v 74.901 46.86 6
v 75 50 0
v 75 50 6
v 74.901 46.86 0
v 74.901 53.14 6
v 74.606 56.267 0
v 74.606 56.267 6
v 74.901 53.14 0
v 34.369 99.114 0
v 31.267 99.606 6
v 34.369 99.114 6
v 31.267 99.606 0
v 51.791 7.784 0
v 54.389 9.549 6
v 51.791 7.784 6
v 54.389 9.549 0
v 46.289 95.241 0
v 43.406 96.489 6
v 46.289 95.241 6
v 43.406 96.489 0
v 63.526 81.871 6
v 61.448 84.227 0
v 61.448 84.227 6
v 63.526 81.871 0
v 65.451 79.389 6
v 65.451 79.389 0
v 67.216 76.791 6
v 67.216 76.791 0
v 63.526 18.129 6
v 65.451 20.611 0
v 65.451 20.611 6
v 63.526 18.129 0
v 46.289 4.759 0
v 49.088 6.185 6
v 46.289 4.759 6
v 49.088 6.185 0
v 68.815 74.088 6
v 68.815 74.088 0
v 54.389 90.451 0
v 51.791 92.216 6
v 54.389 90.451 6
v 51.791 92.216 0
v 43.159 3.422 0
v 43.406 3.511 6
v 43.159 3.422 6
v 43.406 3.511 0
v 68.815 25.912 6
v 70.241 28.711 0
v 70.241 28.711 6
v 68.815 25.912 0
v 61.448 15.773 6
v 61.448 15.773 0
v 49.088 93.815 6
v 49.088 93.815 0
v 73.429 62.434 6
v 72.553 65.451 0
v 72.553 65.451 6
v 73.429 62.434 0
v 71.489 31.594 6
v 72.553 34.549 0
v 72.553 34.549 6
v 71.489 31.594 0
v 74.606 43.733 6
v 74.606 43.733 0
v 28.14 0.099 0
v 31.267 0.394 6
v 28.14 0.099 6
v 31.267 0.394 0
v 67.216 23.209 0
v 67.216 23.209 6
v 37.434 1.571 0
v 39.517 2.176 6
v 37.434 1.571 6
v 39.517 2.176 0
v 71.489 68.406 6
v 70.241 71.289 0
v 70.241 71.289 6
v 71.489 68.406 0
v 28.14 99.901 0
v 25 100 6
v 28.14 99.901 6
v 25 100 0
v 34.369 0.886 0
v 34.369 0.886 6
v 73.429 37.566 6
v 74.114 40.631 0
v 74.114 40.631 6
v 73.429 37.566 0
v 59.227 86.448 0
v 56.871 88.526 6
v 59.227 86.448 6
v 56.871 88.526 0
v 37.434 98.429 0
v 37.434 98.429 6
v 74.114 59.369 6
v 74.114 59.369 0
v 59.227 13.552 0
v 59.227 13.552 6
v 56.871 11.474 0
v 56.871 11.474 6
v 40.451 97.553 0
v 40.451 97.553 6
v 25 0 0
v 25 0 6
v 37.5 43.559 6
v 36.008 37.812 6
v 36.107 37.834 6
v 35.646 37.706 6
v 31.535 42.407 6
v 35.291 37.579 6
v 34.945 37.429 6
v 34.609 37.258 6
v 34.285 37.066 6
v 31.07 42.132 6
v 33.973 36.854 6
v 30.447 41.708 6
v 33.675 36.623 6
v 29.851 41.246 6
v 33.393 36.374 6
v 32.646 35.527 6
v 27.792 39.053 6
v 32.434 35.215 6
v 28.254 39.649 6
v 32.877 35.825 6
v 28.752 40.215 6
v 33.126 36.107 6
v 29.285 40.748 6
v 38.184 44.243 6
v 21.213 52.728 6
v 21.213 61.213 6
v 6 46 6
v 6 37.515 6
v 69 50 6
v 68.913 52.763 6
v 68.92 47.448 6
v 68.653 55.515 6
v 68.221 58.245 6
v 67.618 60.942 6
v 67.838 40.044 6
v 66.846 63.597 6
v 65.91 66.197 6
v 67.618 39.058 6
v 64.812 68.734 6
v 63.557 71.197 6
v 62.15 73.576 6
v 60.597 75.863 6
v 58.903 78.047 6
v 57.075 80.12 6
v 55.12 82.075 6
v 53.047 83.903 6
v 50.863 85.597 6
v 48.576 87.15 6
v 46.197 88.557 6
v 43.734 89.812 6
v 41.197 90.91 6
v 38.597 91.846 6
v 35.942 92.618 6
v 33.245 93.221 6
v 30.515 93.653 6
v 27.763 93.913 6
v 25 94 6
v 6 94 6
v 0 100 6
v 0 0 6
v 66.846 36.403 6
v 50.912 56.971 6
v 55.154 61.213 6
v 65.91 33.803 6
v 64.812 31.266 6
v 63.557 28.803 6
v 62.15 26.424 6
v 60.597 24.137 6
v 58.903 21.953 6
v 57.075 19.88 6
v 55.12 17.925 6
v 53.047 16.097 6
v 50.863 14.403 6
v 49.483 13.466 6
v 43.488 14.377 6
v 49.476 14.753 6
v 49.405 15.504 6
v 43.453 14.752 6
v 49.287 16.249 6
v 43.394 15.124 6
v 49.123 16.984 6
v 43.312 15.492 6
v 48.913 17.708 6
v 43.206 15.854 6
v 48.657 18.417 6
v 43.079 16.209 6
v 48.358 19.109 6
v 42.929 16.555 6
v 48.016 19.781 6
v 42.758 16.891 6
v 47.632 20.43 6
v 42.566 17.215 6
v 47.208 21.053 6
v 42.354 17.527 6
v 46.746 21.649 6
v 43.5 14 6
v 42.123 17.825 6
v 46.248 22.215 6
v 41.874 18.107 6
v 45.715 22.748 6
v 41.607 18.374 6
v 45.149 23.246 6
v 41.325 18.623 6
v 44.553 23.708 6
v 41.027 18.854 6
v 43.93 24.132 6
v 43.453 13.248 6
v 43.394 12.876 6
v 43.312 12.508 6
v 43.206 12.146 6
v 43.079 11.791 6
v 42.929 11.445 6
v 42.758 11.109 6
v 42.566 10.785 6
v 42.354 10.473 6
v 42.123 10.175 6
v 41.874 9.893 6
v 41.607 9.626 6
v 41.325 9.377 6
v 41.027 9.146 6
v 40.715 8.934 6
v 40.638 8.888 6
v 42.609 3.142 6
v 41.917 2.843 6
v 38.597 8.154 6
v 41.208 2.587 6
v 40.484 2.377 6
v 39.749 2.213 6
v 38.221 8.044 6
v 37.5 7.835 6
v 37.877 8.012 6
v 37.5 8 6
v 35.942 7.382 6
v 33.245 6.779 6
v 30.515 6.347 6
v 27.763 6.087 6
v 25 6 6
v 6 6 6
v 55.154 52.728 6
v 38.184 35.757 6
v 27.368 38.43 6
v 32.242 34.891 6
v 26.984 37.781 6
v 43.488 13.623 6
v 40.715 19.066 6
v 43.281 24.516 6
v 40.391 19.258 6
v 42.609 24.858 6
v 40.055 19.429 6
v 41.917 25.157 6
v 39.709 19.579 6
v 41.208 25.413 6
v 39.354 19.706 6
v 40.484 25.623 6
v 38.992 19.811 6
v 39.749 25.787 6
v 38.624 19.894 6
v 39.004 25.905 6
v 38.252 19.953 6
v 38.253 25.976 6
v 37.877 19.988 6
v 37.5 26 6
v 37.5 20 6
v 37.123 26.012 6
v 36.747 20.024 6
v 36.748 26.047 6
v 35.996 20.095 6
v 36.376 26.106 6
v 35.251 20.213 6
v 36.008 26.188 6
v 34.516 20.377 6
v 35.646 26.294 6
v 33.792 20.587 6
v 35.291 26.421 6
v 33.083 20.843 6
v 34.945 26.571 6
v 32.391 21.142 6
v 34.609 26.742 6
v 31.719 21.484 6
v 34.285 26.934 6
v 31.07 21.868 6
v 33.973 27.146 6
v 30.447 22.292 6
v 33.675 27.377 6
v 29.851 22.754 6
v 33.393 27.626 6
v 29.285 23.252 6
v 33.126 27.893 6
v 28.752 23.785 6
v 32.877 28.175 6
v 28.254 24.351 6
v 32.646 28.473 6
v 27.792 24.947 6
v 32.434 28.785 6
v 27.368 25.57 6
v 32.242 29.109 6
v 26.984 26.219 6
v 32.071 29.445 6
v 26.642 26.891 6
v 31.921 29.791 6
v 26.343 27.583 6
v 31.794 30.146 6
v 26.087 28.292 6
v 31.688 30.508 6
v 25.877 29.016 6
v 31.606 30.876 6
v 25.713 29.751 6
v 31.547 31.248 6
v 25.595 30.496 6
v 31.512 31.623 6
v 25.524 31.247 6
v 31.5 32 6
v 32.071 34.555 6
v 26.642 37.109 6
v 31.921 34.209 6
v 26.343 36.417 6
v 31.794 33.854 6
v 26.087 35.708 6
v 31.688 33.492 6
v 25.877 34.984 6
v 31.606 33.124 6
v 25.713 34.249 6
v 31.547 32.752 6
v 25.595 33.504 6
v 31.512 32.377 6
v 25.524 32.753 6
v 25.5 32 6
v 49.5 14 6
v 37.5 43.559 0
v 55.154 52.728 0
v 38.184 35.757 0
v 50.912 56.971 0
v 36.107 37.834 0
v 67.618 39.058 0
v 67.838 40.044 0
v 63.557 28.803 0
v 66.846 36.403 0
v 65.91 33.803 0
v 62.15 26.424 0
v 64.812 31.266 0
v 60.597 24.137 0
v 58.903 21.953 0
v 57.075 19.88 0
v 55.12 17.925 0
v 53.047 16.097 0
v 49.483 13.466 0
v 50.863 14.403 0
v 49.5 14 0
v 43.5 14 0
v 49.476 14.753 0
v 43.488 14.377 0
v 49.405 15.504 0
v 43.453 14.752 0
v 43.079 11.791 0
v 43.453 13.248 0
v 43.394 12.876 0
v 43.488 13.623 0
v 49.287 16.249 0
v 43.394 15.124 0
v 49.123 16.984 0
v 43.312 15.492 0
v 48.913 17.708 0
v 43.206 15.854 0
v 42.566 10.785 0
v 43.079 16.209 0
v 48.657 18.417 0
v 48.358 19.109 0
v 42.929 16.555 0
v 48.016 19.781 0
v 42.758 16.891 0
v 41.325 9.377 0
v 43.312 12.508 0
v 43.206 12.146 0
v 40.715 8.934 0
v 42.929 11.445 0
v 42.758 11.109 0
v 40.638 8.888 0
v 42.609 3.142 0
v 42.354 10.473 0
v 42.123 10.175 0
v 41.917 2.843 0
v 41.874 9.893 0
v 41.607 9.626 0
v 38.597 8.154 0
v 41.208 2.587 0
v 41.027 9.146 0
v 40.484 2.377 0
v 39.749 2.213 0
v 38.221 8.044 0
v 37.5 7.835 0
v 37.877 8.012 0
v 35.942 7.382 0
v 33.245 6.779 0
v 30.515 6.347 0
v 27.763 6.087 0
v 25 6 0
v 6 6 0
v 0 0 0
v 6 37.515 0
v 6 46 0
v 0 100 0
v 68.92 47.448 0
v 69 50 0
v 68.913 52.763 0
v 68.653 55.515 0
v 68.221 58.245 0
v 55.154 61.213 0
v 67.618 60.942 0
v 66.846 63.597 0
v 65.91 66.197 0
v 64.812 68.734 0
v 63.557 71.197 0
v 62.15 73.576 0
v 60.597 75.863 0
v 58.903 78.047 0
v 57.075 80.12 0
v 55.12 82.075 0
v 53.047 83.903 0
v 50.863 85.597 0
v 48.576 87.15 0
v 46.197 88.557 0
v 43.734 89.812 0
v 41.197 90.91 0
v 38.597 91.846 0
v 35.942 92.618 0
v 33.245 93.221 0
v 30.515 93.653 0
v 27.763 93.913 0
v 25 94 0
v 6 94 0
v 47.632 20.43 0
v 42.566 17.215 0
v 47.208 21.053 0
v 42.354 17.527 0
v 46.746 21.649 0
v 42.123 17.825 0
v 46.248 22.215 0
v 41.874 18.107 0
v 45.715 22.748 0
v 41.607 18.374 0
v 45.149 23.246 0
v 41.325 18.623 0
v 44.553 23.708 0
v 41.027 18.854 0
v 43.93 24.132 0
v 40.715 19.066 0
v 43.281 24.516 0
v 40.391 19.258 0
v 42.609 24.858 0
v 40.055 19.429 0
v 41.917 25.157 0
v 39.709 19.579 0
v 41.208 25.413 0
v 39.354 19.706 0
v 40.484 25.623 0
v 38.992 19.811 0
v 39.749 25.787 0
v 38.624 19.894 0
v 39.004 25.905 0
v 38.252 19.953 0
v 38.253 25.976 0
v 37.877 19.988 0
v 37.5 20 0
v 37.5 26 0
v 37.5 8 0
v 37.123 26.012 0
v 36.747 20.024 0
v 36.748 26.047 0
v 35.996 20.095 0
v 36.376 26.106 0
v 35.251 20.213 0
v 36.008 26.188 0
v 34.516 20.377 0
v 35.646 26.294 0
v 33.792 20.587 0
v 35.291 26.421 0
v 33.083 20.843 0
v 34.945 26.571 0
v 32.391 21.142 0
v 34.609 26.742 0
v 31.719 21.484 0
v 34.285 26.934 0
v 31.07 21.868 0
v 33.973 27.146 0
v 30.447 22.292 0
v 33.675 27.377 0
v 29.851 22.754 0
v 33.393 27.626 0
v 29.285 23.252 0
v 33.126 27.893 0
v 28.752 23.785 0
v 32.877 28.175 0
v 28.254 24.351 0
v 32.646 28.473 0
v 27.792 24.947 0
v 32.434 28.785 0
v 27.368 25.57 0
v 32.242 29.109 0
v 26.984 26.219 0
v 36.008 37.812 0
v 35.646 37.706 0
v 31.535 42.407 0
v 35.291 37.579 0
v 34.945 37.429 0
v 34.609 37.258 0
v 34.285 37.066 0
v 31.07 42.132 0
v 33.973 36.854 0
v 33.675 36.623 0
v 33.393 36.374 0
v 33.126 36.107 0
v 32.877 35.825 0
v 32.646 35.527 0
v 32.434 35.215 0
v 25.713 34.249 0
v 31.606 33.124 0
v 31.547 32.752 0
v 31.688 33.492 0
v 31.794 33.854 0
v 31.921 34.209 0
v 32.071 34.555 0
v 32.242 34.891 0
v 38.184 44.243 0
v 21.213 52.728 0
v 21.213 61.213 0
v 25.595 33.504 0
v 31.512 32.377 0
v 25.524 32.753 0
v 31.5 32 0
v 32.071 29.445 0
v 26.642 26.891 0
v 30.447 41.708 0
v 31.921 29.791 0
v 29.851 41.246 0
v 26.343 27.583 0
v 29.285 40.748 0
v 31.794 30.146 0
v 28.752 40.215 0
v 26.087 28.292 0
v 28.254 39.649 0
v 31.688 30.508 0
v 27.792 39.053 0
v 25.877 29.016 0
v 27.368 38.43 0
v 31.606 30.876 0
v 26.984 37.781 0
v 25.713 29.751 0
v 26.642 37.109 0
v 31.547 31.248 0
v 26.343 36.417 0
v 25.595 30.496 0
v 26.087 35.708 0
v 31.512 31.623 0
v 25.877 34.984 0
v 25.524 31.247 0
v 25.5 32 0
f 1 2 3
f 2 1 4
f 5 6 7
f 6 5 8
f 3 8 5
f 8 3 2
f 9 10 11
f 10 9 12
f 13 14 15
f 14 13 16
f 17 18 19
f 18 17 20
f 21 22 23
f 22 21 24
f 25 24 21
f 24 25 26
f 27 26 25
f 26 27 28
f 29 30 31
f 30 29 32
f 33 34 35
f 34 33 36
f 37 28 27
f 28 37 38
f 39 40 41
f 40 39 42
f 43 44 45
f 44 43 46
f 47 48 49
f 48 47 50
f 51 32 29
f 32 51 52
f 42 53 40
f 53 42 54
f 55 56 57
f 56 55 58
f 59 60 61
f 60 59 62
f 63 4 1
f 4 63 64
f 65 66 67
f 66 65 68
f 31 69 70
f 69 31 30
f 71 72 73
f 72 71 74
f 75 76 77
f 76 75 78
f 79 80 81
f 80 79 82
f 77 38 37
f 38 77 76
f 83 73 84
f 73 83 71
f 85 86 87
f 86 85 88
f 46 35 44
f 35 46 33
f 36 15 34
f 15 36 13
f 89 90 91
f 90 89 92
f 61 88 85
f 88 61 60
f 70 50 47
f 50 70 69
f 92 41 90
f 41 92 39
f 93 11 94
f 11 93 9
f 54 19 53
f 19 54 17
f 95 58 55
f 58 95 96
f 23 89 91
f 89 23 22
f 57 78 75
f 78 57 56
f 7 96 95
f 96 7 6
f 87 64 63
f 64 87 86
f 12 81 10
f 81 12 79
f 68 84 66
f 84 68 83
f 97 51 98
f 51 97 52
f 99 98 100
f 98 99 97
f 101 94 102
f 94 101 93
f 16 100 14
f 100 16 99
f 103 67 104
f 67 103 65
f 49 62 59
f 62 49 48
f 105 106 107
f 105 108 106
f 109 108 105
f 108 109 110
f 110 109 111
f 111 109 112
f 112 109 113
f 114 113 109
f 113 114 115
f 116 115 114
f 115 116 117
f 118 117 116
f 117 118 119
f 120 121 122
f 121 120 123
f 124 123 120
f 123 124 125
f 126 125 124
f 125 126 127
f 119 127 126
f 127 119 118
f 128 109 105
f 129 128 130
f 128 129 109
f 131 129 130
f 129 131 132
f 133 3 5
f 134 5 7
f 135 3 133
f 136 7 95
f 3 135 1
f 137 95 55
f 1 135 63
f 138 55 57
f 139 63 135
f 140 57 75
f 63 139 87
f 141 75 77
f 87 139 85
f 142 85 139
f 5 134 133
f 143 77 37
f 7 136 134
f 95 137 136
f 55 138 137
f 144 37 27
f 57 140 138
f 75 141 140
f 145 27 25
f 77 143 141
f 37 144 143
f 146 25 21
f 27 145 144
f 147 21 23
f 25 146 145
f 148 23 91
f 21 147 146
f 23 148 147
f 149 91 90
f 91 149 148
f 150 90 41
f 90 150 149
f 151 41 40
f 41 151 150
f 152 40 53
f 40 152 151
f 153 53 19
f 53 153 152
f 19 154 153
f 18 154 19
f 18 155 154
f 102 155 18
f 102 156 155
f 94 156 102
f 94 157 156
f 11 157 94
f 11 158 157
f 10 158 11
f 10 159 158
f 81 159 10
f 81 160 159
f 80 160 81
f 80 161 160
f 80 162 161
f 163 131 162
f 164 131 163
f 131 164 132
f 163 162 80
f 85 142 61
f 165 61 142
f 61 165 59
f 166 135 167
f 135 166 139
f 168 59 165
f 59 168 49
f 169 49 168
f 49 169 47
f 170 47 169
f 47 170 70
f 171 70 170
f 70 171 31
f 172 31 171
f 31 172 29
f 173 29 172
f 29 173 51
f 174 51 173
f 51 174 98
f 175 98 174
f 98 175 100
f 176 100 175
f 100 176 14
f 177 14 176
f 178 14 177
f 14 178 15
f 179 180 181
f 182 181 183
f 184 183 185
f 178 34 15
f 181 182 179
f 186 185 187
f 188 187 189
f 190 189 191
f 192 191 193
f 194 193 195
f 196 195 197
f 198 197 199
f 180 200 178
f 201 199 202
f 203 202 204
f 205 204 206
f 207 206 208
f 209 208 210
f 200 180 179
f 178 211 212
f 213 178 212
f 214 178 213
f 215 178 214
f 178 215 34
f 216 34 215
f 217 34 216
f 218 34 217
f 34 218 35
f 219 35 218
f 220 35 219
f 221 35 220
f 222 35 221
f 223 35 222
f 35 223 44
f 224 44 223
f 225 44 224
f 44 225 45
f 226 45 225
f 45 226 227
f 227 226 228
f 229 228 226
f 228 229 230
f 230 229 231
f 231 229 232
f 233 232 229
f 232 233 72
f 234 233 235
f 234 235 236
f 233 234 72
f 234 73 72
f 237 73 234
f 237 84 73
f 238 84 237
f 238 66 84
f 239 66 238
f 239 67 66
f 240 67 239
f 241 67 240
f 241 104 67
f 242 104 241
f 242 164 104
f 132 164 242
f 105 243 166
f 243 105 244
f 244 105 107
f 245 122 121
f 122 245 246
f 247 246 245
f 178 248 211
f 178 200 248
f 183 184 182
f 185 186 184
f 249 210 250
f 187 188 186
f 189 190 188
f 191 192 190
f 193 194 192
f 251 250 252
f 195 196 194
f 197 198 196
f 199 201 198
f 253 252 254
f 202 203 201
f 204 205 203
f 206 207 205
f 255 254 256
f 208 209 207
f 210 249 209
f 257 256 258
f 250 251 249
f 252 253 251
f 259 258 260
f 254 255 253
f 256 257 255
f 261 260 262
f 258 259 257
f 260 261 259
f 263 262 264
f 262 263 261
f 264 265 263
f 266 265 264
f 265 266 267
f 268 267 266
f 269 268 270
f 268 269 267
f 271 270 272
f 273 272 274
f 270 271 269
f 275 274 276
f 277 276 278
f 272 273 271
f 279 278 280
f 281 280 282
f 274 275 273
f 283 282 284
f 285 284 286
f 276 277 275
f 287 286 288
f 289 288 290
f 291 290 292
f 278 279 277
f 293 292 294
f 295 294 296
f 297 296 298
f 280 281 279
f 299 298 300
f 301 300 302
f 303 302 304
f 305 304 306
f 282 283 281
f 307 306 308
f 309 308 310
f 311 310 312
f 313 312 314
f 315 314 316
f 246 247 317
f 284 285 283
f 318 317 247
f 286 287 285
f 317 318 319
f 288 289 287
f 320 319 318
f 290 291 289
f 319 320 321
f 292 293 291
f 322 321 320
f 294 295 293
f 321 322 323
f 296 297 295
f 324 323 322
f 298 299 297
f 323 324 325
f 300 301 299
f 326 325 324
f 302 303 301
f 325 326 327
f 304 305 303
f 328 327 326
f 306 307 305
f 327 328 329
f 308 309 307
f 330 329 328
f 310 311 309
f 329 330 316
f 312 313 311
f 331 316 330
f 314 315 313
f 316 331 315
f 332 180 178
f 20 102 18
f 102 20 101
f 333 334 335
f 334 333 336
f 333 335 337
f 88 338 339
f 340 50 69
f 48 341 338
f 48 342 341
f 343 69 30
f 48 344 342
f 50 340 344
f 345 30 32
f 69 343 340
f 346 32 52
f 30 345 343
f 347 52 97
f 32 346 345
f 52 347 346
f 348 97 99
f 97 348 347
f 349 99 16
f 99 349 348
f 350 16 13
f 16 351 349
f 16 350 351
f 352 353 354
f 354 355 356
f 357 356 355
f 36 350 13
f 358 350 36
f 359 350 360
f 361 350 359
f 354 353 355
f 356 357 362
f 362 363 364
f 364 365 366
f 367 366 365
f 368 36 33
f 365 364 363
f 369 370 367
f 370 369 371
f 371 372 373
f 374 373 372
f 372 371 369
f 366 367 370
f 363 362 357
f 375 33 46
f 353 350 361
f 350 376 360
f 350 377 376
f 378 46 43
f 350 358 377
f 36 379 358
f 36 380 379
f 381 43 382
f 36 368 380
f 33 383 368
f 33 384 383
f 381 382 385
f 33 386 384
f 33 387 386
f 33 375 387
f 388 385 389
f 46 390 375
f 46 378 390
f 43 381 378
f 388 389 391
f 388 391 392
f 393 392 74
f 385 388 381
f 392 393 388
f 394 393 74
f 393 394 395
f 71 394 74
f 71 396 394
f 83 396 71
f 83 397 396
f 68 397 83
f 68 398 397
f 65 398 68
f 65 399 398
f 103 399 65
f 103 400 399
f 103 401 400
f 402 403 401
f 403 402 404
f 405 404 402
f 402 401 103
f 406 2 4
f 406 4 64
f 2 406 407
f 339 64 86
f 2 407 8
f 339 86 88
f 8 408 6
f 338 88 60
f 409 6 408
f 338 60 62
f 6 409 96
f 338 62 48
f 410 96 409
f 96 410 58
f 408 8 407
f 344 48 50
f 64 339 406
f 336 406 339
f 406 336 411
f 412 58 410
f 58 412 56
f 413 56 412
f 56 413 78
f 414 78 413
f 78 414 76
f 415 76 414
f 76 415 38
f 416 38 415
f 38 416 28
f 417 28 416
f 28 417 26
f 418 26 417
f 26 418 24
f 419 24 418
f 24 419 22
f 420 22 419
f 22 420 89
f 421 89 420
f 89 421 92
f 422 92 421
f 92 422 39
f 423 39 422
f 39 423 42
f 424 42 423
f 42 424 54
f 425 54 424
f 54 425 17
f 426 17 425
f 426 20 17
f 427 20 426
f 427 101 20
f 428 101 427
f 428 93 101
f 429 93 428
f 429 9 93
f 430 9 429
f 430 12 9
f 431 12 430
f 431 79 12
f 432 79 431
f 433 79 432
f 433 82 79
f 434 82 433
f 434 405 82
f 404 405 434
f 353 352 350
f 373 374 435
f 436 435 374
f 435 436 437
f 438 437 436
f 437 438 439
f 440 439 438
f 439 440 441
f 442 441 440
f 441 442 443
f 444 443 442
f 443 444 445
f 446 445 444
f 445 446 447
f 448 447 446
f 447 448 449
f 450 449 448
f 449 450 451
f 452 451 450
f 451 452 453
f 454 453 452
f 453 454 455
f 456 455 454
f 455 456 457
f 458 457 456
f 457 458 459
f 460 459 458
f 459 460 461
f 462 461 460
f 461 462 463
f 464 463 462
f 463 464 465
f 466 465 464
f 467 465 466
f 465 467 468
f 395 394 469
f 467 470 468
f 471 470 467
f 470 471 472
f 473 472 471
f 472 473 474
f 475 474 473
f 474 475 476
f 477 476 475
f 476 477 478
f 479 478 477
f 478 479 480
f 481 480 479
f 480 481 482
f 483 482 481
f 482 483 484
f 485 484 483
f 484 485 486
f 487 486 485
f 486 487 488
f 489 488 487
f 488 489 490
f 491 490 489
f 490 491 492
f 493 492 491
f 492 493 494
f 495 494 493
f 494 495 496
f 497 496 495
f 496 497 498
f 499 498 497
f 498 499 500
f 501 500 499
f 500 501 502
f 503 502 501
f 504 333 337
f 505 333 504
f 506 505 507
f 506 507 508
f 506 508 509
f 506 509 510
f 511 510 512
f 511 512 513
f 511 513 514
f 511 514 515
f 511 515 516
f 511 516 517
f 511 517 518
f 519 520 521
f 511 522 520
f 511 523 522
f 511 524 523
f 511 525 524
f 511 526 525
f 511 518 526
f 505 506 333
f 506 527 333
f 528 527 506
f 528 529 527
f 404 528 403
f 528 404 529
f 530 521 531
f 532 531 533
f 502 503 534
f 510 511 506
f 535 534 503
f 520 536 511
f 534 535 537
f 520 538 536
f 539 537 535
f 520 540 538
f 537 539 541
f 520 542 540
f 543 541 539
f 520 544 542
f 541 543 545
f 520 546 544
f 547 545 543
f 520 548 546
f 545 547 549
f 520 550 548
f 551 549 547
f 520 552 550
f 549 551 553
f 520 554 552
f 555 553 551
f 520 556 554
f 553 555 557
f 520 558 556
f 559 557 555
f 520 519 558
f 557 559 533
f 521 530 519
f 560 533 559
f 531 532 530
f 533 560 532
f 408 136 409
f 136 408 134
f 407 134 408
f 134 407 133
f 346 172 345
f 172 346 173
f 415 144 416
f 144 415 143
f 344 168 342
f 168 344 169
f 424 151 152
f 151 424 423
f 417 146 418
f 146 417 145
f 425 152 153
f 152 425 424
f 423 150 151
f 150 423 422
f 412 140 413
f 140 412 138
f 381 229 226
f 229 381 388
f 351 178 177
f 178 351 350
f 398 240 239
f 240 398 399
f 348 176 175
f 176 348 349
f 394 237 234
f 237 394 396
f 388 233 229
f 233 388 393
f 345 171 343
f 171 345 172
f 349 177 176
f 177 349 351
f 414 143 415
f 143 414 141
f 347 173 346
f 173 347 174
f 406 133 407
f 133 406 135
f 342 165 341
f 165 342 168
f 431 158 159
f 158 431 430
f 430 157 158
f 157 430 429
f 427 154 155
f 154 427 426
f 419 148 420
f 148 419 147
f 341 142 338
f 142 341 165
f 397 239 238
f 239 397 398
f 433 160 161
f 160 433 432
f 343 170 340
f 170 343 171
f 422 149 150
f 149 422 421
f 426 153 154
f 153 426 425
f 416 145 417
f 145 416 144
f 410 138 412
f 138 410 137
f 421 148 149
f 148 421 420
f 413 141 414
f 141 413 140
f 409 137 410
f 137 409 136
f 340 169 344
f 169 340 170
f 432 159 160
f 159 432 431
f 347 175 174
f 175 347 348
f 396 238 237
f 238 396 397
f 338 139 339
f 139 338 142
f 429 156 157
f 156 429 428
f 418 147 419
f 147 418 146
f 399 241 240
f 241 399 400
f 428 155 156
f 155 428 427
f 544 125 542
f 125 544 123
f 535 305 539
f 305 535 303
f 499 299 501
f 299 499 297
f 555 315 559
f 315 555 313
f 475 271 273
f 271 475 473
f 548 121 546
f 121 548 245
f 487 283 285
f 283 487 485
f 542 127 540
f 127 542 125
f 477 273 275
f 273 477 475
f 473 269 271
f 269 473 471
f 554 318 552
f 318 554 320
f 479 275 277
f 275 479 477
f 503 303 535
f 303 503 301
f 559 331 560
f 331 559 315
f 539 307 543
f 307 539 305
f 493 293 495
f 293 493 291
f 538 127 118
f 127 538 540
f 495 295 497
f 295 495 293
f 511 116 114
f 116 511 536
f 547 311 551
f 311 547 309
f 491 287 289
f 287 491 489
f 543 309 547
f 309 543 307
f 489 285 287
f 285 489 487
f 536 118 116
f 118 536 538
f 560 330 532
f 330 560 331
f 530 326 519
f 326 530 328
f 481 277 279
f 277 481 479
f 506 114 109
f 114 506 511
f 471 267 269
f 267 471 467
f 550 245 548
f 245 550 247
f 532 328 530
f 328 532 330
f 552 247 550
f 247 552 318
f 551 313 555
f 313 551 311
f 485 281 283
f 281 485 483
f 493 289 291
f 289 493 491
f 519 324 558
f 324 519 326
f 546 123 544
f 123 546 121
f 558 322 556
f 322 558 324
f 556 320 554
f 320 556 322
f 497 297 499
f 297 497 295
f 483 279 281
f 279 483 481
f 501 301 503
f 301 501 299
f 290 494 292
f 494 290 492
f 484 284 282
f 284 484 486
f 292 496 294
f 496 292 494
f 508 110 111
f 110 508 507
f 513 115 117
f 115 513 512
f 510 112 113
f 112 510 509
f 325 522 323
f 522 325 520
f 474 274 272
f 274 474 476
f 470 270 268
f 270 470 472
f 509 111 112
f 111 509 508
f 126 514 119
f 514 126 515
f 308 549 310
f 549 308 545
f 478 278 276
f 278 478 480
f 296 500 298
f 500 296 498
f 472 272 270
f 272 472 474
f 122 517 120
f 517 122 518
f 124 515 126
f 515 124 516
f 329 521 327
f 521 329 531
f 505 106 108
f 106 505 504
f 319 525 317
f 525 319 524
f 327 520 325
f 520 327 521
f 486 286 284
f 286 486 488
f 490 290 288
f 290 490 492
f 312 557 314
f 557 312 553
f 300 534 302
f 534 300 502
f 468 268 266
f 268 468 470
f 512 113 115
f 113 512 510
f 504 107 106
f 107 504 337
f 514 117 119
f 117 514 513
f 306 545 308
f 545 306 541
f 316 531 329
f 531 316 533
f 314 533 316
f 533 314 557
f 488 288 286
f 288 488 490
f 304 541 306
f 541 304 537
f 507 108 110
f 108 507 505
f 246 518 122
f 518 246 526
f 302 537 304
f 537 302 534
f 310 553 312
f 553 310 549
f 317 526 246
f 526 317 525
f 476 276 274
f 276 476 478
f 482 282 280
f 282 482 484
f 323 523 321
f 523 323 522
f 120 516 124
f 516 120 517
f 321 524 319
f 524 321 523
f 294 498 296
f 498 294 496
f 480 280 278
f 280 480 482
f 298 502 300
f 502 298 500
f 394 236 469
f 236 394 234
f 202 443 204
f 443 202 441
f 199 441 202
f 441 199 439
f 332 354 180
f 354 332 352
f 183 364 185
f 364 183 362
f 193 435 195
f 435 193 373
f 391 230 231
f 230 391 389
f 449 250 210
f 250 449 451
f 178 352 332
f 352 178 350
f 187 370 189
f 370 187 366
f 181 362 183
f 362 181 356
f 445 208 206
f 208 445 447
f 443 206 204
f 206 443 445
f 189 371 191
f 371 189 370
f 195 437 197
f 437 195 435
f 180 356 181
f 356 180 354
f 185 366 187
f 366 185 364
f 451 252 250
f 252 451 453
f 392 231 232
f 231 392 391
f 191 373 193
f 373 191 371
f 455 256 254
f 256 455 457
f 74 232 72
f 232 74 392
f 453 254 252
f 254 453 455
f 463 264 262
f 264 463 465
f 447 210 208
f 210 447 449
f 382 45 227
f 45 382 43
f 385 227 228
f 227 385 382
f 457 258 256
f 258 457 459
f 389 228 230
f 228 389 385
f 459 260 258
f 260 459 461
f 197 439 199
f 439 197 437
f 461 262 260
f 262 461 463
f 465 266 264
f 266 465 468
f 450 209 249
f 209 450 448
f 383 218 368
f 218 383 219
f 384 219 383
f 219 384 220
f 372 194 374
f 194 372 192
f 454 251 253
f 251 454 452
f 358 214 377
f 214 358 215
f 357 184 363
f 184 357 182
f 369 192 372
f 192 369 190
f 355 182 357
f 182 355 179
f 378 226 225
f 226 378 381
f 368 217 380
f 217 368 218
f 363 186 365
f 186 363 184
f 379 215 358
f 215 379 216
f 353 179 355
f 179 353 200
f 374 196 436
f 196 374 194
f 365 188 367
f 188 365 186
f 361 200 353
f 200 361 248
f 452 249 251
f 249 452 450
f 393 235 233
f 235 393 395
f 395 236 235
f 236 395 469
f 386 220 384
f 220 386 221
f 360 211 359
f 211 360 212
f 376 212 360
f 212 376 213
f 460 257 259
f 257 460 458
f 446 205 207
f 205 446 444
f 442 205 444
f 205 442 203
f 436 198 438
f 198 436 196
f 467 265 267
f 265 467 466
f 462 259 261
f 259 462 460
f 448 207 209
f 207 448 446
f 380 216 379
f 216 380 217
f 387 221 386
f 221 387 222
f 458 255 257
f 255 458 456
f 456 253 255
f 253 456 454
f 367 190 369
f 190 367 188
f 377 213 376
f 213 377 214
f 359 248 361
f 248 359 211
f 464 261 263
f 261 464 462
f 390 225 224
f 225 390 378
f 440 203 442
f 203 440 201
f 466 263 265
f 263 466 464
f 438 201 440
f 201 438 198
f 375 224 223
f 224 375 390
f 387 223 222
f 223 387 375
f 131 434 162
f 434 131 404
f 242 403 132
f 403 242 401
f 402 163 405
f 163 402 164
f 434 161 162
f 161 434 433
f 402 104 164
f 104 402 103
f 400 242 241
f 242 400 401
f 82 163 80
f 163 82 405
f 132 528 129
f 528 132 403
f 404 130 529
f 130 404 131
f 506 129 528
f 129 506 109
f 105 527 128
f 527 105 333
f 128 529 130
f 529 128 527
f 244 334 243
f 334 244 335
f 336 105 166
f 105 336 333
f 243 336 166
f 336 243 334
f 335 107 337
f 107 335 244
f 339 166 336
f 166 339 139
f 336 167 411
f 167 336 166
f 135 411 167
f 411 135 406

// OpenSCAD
module dmsLogo(height, depth)
{
   w = 25; // width or stand off of D before curve
   m = 24; // length of the line segments in the 'M'
   mxy = sqrt(m*m/2);
   fn  = 100;

   resize([0, height, depth], auto = [true,true,false])
      union()
      {
         // letter 'D'
         translate([0,  0, 0]) cube([  6,  94, 1 ], center = false ); // Body of 'D'
         translate([0,  0, 0]) cube([  w,   6, 1 ], center = false ); // Bottom arm of 'D'
         translate([0, 94, 0]) cube([  w,   6, 1 ], center = false ); // Top arm of 'D'
         difference() // Curve of 'D'
         {
            translate([   w, 50,  0 ])   cylinder(h = 1, r1 = 50, r2 = 50, center = false, $fn = fn);
            translate([   w, 50, -1 ])   cylinder(h = 3, r1 = 44, r2 = 44, center = false, $fn = fn);
            translate([ w-101,  0, -1 ]) cube([ 101, 100, 3 ],             center = false );
         };

         // letter 'M'
         translate([     0, 40, 0 ]) rotate(a=[ 0, 0, 315 ]) cube([ 6, m, 1 ], center = false );
         translate([ mxy*2, 40, 0 ]) rotate(a=[ 0, 0,  45 ]) cube([ 6, m, 1 ], center = false );
         translate([ mxy*2, 40, 0 ]) rotate(a=[ 0, 0, 315 ]) cube([ 6, m, 1 ], center = false );
         translate([ mxy*4, 40, 0 ]) rotate(a=[ 0, 0,  45 ]) cube([ 6, m, 1 ], center = false );
 
         // letter 'S'
         difference() // top curve of 'S'
         {
            translate([ (w+50)/2, 32, 0]) cylinder(h = 1, r1 = 12, r2 = 12, center = false, $fn = fn);
            translate([ (w+50)/2, 32, 0]) cylinder(h = 1, r1 =  6, r2 =  6, center = false, $fn = fn);
            translate([ (w+50)/2, 0, -1 ] ) cube( [ 30, 100, 3] ,           center = false );
         };
         difference() // bottom curve of 'S'
         {
            translate([ (w+50)/2, 14, 0]) cylinder(h = 1, r1 = 12, r2 = 12, center = false, $fn = fn);
            translate([ (w+50)/2, 14, 0]) cylinder(h = 1, r1 =  6, r2 =  6, center = false, $fn = fn);
            translate([        0, 0, -1 ] ) cube( [ (w+50)/2, 30, 3] ,           center = false );
         };
      };
};

dmsLogo(100, 6);
